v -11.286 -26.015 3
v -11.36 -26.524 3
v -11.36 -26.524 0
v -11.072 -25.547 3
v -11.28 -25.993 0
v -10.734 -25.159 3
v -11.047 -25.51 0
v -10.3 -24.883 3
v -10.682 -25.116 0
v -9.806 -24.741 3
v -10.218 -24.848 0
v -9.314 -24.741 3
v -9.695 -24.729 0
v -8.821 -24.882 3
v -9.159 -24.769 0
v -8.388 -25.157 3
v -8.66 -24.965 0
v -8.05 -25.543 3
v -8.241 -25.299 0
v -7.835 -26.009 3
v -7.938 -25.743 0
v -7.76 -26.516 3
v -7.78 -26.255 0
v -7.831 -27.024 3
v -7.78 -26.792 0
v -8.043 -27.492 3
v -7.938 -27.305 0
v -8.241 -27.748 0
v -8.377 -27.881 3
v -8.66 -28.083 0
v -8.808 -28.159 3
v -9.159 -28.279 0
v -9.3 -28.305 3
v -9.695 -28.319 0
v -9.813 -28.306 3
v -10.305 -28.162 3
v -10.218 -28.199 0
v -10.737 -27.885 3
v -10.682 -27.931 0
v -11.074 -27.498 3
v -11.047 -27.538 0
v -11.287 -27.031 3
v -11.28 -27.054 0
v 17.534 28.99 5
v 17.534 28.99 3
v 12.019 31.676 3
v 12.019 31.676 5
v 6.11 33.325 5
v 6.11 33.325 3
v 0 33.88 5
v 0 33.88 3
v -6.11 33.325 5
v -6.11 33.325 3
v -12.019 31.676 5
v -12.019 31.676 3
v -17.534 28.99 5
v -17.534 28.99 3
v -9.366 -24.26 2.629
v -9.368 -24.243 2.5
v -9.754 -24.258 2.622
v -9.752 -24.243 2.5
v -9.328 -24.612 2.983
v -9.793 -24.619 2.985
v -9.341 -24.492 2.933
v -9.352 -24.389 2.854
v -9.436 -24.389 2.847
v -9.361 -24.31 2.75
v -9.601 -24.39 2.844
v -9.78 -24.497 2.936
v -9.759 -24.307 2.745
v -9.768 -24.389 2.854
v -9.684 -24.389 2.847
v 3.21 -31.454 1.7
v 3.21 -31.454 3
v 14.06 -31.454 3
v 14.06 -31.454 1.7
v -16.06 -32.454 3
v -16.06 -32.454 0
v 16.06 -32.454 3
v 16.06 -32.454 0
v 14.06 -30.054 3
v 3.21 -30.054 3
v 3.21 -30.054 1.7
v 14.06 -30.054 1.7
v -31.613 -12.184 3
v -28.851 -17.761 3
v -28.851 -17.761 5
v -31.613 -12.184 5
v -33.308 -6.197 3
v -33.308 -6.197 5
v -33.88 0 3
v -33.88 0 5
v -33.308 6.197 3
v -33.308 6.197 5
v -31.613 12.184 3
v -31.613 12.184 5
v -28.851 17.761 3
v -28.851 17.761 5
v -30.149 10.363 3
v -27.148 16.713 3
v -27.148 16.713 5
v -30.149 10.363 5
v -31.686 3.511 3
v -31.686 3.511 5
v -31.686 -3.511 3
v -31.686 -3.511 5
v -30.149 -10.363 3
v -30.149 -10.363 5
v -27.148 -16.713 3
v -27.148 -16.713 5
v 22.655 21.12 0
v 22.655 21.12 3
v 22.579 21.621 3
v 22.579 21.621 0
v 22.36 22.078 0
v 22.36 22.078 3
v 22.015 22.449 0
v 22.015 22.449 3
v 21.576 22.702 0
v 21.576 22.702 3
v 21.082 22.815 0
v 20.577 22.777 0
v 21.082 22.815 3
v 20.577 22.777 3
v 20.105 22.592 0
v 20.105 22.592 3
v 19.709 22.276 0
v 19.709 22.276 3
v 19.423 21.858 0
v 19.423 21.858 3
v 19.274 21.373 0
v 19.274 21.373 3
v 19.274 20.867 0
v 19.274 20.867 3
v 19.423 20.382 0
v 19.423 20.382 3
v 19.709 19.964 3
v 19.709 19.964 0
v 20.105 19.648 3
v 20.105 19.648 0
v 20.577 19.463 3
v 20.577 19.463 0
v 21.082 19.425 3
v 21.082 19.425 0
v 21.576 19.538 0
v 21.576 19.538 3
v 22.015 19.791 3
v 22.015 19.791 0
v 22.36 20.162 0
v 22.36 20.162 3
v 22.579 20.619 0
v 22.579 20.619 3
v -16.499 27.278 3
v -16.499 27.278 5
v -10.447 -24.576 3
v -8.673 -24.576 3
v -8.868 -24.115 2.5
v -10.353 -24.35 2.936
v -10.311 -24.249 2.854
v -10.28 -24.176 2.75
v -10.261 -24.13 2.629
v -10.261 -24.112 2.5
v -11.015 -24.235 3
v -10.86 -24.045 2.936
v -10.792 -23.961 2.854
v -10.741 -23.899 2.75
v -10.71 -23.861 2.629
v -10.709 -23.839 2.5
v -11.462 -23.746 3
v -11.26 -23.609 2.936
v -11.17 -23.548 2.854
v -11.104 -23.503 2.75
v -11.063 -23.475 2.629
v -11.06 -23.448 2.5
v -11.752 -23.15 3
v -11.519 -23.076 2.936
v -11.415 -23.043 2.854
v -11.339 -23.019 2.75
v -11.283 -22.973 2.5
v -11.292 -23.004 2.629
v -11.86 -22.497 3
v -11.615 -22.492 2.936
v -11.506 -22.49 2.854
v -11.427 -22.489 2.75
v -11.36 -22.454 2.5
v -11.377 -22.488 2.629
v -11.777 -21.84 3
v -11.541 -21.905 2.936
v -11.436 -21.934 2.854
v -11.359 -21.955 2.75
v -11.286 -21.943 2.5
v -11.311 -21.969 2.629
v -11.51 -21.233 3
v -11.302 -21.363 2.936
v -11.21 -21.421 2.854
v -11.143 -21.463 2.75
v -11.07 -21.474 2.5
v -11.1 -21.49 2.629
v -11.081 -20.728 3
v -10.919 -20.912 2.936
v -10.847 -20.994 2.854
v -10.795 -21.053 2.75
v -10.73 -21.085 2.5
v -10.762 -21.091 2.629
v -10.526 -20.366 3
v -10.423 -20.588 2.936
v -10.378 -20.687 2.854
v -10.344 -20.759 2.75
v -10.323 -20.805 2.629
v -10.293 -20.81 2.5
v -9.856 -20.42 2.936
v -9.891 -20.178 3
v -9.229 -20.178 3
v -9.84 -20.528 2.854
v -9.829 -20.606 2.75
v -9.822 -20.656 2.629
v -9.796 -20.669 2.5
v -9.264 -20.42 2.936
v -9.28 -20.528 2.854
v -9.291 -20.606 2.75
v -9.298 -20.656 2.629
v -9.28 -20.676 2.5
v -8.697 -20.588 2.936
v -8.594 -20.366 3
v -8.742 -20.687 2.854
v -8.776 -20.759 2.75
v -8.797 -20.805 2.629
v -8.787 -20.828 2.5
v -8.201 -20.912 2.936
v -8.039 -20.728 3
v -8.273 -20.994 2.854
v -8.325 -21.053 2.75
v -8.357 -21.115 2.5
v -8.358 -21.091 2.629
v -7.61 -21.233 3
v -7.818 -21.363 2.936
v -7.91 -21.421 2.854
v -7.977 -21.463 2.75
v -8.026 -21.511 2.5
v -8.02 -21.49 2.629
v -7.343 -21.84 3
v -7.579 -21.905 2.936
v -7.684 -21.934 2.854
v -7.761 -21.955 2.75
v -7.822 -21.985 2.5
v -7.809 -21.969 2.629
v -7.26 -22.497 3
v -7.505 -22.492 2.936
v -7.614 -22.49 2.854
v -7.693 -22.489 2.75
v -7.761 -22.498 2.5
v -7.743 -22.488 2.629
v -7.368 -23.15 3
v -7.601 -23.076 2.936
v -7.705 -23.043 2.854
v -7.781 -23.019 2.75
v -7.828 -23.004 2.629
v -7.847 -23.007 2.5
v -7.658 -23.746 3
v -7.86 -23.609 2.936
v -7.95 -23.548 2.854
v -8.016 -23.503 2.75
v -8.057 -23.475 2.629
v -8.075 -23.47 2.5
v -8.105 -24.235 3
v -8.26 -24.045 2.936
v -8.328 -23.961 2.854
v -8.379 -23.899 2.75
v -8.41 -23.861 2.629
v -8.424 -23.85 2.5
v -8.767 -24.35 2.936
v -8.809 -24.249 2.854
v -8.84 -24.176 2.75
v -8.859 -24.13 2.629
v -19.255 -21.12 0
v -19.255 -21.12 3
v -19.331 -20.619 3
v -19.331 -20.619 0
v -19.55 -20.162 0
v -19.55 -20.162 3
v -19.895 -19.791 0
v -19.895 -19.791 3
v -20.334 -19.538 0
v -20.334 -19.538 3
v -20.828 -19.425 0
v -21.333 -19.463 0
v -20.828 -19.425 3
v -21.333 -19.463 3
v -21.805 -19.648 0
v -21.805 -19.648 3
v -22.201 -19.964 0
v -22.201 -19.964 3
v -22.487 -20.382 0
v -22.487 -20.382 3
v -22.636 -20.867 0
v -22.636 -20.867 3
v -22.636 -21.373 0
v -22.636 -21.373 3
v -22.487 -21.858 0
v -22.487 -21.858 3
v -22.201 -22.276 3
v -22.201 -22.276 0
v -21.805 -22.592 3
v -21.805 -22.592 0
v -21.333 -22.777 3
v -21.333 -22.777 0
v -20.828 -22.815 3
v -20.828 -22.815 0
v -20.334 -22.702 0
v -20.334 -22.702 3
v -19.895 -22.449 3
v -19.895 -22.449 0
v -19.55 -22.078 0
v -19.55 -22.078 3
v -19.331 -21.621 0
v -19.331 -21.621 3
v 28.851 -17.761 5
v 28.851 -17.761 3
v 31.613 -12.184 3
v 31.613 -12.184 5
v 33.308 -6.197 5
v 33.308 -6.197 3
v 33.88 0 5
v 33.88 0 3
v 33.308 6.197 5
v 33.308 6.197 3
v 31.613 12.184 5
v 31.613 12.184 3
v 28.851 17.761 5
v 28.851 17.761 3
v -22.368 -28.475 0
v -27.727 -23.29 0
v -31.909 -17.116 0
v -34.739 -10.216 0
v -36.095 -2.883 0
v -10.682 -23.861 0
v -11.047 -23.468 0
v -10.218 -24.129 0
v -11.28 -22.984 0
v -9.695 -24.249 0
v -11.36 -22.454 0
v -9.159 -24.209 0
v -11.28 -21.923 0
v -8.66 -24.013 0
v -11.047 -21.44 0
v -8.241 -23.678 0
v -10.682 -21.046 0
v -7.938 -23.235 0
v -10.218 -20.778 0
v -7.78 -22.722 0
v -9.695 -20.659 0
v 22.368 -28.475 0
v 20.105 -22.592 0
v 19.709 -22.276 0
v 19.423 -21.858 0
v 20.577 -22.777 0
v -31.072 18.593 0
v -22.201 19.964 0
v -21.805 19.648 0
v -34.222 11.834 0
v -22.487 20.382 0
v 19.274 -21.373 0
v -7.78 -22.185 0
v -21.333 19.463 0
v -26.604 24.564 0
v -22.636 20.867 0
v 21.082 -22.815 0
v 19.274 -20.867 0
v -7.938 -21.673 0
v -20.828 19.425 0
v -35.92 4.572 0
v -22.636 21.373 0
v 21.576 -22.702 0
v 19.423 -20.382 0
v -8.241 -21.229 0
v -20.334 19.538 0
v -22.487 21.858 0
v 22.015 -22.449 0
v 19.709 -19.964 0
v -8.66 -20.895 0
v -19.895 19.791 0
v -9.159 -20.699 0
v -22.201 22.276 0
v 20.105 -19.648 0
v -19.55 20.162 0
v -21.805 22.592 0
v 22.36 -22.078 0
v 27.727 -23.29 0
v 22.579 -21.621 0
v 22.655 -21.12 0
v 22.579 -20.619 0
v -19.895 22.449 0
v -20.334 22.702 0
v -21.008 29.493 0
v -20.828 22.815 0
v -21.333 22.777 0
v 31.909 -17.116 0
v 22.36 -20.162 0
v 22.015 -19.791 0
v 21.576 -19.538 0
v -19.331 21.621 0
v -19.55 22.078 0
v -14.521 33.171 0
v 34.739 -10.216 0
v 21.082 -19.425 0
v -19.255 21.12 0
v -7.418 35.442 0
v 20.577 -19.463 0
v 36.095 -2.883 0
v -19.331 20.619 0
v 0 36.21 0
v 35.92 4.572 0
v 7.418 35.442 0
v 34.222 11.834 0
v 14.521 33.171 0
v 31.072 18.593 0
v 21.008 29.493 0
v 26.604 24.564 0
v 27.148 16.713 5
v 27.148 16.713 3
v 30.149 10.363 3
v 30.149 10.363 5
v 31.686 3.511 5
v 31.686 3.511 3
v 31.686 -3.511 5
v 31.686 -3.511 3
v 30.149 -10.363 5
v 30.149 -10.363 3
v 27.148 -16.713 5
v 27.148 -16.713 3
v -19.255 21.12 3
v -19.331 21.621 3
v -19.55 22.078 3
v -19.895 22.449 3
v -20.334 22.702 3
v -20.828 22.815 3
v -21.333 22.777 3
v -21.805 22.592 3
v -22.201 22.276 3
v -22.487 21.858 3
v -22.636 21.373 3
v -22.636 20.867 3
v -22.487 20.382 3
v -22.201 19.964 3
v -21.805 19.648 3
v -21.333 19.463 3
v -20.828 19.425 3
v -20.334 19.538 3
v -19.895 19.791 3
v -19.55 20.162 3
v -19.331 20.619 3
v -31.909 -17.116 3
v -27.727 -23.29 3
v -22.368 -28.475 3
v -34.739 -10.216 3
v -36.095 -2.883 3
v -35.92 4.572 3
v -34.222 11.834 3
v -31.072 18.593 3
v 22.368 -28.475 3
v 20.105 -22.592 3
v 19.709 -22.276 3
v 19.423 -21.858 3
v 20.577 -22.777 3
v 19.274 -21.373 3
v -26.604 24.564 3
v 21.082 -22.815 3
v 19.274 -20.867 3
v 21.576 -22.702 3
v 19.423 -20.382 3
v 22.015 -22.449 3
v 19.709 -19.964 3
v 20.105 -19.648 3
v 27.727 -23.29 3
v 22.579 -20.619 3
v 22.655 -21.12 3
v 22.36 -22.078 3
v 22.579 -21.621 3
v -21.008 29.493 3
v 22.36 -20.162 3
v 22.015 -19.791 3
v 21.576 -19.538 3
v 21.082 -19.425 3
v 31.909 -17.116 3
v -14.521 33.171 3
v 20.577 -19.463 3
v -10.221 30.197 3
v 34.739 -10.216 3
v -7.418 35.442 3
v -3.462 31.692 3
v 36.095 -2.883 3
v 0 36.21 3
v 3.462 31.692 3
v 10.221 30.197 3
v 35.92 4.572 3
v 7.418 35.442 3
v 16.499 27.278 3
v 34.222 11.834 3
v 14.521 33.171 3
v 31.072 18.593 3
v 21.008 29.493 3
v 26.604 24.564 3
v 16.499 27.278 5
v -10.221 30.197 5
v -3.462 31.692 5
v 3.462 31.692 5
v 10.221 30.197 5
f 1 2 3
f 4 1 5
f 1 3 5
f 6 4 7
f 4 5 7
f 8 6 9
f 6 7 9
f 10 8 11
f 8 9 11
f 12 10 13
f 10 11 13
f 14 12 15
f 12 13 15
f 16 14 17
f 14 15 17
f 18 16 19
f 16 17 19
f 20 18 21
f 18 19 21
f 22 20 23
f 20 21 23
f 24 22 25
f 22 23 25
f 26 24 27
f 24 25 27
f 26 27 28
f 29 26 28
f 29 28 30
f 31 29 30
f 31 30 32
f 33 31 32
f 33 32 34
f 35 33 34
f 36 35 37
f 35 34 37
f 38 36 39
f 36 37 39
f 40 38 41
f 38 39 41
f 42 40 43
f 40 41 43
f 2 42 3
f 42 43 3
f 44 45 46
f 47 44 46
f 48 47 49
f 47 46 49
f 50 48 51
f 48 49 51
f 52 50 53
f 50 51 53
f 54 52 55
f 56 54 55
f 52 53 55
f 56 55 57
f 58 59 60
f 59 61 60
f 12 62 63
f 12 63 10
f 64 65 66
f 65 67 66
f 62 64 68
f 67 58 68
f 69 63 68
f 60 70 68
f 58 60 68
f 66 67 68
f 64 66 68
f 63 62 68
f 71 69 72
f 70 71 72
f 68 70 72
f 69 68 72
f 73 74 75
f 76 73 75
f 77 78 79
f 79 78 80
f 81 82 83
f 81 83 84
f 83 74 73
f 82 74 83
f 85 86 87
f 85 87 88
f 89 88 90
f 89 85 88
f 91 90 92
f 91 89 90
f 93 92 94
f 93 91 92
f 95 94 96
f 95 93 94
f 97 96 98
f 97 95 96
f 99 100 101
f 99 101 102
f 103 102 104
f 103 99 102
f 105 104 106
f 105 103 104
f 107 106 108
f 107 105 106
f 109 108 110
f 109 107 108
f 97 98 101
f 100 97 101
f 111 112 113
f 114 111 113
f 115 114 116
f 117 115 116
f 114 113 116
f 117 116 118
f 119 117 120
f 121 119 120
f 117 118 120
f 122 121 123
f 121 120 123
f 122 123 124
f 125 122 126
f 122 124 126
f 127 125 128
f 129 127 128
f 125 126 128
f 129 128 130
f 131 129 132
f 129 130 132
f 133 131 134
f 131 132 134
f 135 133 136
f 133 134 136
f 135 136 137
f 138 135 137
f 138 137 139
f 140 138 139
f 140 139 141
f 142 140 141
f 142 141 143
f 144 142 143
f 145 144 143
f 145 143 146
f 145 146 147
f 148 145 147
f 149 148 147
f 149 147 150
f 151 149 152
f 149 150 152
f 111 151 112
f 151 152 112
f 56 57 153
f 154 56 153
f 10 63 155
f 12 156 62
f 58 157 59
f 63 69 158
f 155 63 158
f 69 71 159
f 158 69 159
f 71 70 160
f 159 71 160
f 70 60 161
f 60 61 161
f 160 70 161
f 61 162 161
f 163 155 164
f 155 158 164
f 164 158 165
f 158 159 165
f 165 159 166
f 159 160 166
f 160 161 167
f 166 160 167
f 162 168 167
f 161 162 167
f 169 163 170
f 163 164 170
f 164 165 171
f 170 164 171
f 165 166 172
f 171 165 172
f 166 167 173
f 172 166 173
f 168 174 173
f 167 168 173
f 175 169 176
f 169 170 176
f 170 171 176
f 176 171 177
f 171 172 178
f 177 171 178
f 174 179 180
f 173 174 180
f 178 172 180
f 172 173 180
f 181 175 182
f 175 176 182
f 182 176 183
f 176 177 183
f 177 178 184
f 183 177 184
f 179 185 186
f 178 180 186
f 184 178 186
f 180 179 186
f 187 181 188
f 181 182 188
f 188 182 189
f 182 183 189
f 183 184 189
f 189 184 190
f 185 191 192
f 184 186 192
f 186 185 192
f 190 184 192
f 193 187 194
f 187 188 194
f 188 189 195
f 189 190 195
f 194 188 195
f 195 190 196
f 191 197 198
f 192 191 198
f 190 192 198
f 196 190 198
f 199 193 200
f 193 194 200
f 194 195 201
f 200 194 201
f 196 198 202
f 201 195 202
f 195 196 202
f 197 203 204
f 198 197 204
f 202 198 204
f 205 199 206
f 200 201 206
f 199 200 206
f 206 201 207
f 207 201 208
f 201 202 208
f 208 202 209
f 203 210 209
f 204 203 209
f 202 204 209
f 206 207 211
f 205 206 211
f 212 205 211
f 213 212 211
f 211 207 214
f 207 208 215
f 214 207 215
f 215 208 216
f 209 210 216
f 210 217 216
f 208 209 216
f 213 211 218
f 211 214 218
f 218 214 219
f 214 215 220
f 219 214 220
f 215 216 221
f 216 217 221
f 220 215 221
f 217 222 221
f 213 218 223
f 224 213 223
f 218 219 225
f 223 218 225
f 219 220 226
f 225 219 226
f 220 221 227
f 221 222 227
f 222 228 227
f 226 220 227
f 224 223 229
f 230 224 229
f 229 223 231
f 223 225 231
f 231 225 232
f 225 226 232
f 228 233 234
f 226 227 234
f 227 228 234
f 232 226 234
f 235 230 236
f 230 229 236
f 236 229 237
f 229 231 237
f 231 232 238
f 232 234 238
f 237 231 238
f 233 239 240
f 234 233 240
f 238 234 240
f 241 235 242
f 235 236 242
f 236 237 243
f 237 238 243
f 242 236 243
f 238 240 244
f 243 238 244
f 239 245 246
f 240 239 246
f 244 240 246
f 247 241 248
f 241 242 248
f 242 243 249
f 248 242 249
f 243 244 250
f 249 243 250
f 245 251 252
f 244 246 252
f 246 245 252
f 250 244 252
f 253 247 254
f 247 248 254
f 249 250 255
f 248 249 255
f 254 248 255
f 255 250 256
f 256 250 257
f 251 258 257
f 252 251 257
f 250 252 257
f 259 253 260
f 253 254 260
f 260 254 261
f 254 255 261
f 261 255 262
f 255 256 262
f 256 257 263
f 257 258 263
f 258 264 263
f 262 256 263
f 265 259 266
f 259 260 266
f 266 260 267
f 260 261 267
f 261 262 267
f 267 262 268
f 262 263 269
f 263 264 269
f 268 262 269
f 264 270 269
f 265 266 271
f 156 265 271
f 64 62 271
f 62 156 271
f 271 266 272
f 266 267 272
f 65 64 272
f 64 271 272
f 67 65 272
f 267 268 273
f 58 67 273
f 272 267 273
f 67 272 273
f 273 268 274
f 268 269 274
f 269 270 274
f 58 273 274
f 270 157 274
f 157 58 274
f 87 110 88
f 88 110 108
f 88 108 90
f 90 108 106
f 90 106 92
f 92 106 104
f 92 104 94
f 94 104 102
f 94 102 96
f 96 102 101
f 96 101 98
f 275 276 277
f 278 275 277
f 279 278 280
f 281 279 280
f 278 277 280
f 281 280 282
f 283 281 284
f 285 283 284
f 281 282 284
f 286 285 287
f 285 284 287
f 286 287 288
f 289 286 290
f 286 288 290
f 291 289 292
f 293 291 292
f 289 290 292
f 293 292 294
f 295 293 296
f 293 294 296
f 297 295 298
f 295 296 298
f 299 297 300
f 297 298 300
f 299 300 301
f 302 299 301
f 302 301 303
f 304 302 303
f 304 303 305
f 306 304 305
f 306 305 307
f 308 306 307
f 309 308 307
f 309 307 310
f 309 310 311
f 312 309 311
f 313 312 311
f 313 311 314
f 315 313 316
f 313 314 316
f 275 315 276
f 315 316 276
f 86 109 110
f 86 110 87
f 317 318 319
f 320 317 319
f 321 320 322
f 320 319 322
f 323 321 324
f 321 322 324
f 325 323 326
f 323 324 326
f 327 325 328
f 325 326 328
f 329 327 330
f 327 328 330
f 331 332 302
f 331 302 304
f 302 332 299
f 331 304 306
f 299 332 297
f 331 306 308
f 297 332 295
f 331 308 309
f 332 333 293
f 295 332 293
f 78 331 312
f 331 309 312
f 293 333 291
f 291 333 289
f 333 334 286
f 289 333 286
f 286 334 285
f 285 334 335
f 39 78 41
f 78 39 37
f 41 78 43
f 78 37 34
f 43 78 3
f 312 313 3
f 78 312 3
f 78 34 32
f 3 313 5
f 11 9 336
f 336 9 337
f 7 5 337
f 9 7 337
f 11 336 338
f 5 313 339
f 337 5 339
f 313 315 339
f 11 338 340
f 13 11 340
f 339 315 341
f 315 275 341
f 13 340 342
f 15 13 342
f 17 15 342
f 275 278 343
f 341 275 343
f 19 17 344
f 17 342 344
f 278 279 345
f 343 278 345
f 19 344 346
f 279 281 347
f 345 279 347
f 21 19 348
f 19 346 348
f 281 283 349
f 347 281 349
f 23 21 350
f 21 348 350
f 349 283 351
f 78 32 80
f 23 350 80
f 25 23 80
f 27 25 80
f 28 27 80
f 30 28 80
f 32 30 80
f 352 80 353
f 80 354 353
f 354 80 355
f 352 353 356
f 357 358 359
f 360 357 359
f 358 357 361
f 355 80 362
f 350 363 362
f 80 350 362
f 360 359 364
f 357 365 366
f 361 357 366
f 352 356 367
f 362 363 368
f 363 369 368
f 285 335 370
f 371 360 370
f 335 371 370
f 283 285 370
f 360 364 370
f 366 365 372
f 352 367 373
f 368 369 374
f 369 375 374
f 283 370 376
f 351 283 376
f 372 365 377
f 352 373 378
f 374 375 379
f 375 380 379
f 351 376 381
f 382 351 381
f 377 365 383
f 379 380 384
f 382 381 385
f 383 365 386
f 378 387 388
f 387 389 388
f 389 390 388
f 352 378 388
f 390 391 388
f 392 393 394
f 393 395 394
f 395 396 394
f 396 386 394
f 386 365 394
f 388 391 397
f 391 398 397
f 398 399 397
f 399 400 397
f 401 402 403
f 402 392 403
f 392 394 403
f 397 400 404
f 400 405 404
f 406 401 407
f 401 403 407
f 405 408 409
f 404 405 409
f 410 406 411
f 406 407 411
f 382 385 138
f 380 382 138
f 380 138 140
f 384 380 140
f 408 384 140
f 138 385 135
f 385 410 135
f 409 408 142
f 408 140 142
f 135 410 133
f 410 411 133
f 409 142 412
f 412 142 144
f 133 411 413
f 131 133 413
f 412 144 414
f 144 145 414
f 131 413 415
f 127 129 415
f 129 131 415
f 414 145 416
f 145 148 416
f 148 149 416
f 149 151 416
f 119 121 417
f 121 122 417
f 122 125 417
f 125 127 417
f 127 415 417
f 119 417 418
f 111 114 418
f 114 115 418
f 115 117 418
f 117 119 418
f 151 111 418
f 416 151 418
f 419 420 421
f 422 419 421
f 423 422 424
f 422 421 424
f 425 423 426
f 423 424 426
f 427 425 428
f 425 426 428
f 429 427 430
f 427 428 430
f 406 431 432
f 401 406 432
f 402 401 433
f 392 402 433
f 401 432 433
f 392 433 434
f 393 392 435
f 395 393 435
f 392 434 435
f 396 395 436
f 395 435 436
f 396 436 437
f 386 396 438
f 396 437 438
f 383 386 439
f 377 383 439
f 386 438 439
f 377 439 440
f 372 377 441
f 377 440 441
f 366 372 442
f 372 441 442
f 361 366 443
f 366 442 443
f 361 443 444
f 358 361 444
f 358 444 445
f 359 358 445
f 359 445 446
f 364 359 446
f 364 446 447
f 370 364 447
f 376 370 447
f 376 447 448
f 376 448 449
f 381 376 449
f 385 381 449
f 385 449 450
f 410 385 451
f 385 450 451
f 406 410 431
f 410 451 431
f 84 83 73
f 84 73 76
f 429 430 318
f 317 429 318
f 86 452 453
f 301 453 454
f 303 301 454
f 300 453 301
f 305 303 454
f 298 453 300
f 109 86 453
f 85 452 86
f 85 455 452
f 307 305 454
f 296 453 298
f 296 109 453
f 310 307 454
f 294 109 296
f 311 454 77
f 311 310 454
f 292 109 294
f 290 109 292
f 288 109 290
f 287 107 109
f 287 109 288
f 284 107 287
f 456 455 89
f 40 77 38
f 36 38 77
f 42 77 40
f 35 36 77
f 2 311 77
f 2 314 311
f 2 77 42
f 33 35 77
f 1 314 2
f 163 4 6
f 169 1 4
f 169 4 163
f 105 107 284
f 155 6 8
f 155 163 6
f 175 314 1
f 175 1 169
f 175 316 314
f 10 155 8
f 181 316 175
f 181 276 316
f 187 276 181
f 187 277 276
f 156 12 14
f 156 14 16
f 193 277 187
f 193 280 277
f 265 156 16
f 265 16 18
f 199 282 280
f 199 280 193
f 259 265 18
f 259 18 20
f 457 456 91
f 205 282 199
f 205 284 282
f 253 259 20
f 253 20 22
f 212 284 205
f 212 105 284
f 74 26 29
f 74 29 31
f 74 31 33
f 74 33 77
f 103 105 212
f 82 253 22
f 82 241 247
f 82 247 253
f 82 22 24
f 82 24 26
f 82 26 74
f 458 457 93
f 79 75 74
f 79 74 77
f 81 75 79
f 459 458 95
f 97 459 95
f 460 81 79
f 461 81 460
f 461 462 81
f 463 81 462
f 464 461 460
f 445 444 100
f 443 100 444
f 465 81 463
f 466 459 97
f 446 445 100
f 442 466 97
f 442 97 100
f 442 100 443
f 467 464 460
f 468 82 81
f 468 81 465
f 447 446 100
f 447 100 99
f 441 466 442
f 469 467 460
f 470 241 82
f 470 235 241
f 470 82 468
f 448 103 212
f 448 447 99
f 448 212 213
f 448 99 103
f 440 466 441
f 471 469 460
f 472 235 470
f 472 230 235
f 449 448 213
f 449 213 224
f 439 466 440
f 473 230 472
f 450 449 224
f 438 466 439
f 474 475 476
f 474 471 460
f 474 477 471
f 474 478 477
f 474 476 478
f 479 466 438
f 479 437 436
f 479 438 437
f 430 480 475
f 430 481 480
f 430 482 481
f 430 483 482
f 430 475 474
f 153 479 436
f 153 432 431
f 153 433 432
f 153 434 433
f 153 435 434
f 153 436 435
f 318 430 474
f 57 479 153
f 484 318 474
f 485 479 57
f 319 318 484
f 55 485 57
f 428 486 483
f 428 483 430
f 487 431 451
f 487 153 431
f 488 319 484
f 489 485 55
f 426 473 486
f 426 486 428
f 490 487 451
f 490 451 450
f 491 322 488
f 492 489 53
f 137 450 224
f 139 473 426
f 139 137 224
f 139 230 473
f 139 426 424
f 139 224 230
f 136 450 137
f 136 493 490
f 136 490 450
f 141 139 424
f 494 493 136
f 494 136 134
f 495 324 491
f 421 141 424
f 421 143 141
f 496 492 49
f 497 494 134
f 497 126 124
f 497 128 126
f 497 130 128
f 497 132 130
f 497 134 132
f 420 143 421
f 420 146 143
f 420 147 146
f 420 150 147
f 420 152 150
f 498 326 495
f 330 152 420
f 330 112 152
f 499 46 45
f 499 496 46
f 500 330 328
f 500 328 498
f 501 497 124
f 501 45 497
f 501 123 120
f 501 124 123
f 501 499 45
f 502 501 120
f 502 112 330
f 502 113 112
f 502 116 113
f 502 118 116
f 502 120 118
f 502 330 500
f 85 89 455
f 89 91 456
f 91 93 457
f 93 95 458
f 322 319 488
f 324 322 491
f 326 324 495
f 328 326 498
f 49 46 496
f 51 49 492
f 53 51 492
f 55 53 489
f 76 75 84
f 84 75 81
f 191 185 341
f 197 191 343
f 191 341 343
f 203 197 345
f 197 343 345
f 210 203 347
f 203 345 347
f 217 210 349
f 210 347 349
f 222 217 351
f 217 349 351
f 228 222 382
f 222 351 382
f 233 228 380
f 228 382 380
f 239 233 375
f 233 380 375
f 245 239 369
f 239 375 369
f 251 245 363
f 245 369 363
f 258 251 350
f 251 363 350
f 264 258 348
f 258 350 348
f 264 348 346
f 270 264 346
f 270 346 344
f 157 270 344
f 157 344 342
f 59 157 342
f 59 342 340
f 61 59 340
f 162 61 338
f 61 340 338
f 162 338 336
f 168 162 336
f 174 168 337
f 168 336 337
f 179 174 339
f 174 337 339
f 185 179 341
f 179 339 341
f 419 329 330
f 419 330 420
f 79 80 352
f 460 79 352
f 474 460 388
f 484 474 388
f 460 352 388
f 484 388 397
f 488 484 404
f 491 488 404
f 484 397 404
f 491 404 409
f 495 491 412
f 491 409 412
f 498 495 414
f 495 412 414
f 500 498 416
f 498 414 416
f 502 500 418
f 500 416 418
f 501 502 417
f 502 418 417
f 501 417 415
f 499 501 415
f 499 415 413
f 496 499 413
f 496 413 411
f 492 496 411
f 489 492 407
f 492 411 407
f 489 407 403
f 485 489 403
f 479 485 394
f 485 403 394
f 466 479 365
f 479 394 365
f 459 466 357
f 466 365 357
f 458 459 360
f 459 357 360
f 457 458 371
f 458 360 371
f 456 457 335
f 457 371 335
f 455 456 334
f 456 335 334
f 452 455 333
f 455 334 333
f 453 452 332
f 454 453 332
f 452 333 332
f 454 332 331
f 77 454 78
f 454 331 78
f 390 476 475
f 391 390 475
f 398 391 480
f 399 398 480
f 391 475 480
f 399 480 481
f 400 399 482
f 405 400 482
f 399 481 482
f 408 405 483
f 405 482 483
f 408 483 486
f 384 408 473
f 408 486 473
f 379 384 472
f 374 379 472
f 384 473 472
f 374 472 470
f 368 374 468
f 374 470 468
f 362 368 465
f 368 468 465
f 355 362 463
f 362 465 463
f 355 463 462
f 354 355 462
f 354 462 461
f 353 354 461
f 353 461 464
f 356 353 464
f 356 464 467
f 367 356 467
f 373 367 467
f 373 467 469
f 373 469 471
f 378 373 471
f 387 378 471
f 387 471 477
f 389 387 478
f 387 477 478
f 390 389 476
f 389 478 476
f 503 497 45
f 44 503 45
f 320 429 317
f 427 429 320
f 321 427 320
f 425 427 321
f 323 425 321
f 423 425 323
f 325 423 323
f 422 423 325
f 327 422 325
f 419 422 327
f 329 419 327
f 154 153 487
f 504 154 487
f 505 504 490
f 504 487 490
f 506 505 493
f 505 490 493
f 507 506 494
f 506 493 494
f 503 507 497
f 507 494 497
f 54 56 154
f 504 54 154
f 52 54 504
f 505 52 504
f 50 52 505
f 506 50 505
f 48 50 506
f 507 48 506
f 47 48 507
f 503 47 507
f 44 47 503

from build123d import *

# Parameters (mm, degrees)
BOSS_EXTRUDE1_DEPTH = 3
SKETCH2_R           = 1.7
CUT_EXTRUDE1_DEPTH  = 3
BOSS_EXTRUDE2_DEPTH = 2
SKETCH6_R           = 1.8
CUT_EXTRUDE2_DEPTH  = 3
SKETCH8_W           = 10.85
SKETCH8_H           = 1.4
CUT_EXTRUDE4_DEPTH  = 1.3
FILLET2_R           = 0.5


with BuildPart() as part:
    # Sketch1 → Boss-Extrude1 (new body)
    with BuildSketch(Plane.XY):
        with BuildLine():
            Line((-16.06, -32.453666973), (16.06, -32.453666973))
            ThreePointArc((16.06, -32.453666973), (0, 36.21), (-16.06, -32.453666973))
        make_face()
    extrude(amount=BOSS_EXTRUDE1_DEPTH)

    # Sketch2 → Cut-Extrude1 (cut)
    with BuildSketch(Plane.XY.offset(3)):
        with Locations((-20.955, 21.12)):
            Circle(SKETCH2_R)
        with Locations((20.955, 21.12)):
            Circle(SKETCH2_R)
        with Locations((-20.955, -21.12)):
            Circle(SKETCH2_R)
        with Locations((20.955, -21.12)):
            Circle(SKETCH2_R)
    extrude(amount=-CUT_EXTRUDE1_DEPTH, mode=Mode.SUBTRACT)

    # Sketch4 → Boss-Extrude2 (add)
    with BuildSketch(Plane.XY.offset(3)):
        with BuildLine():
            Line((-17.534144761, 28.989794195), (-16.499071281, 27.278472224))
            ThreePointArc((-16.499071281, 27.278472224), (0, 31.88), (16.499071281, 27.278472224))
            Line((16.499071281, 27.278472224), (17.534144761, 28.989794195))
            ThreePointArc((17.534144761, 28.989794195), (0, 33.88), (-17.534144761, 28.989794195))
        make_face()
        with BuildLine():
            Line((-28.851381969, 17.760972903), (-27.148230731, 16.712509332))
            ThreePointArc((-27.148230731, 16.712509332), (-31.88, 0), (-27.148230731, -16.712509332))
            Line((-27.148230731, -16.712509332), (-28.851381969, -17.760972903))
            ThreePointArc((-28.851381969, -17.760972903), (-33.88, 0), (-28.851381969, 17.760972903))
        make_face()
        with BuildLine():
            Line((28.851381969, 17.760972903), (27.148230731, 16.712509332))
            ThreePointArc((27.148230731, 16.712509332), (31.88, 0), (27.148230731, -16.712509332))
            Line((27.148230731, -16.712509332), (28.851381969, -17.760972903))
            ThreePointArc((28.851381969, -17.760972903), (33.88, 0), (28.851381969, 17.760972903))
        make_face()
    extrude(amount=BOSS_EXTRUDE2_DEPTH)

    # Sketch6 → Cut-Extrude2 (cut)
    with BuildSketch(Plane(origin=(0, 0, 0), x_dir=(-1, 0, 0), z_dir=(0, 0, -1))):
        with Locations((9.56, -22.453666973)):
            Circle(SKETCH6_R)
        with Locations((9.56, -26.523666973)):
            Circle(SKETCH6_R)
    extrude(amount=-CUT_EXTRUDE2_DEPTH, mode=Mode.SUBTRACT)

    # Sketch8 → Cut-Extrude4 (cut)
    with BuildSketch(Plane.XY.offset(3)):
        with Locations((8.635, -30.753666973)):
            Rectangle(SKETCH8_W, SKETCH8_H)
    extrude(amount=-CUT_EXTRUDE4_DEPTH, mode=Mode.SUBTRACT)

    # Fillet2
    fillet2_edges = [part.edges().sort_by_distance(p)[0] for p in [
        (-7.76, -22.453666973, 3),
    ]]
    fillet(fillet2_edges, radius=FILLET2_R)


solid = part.part
